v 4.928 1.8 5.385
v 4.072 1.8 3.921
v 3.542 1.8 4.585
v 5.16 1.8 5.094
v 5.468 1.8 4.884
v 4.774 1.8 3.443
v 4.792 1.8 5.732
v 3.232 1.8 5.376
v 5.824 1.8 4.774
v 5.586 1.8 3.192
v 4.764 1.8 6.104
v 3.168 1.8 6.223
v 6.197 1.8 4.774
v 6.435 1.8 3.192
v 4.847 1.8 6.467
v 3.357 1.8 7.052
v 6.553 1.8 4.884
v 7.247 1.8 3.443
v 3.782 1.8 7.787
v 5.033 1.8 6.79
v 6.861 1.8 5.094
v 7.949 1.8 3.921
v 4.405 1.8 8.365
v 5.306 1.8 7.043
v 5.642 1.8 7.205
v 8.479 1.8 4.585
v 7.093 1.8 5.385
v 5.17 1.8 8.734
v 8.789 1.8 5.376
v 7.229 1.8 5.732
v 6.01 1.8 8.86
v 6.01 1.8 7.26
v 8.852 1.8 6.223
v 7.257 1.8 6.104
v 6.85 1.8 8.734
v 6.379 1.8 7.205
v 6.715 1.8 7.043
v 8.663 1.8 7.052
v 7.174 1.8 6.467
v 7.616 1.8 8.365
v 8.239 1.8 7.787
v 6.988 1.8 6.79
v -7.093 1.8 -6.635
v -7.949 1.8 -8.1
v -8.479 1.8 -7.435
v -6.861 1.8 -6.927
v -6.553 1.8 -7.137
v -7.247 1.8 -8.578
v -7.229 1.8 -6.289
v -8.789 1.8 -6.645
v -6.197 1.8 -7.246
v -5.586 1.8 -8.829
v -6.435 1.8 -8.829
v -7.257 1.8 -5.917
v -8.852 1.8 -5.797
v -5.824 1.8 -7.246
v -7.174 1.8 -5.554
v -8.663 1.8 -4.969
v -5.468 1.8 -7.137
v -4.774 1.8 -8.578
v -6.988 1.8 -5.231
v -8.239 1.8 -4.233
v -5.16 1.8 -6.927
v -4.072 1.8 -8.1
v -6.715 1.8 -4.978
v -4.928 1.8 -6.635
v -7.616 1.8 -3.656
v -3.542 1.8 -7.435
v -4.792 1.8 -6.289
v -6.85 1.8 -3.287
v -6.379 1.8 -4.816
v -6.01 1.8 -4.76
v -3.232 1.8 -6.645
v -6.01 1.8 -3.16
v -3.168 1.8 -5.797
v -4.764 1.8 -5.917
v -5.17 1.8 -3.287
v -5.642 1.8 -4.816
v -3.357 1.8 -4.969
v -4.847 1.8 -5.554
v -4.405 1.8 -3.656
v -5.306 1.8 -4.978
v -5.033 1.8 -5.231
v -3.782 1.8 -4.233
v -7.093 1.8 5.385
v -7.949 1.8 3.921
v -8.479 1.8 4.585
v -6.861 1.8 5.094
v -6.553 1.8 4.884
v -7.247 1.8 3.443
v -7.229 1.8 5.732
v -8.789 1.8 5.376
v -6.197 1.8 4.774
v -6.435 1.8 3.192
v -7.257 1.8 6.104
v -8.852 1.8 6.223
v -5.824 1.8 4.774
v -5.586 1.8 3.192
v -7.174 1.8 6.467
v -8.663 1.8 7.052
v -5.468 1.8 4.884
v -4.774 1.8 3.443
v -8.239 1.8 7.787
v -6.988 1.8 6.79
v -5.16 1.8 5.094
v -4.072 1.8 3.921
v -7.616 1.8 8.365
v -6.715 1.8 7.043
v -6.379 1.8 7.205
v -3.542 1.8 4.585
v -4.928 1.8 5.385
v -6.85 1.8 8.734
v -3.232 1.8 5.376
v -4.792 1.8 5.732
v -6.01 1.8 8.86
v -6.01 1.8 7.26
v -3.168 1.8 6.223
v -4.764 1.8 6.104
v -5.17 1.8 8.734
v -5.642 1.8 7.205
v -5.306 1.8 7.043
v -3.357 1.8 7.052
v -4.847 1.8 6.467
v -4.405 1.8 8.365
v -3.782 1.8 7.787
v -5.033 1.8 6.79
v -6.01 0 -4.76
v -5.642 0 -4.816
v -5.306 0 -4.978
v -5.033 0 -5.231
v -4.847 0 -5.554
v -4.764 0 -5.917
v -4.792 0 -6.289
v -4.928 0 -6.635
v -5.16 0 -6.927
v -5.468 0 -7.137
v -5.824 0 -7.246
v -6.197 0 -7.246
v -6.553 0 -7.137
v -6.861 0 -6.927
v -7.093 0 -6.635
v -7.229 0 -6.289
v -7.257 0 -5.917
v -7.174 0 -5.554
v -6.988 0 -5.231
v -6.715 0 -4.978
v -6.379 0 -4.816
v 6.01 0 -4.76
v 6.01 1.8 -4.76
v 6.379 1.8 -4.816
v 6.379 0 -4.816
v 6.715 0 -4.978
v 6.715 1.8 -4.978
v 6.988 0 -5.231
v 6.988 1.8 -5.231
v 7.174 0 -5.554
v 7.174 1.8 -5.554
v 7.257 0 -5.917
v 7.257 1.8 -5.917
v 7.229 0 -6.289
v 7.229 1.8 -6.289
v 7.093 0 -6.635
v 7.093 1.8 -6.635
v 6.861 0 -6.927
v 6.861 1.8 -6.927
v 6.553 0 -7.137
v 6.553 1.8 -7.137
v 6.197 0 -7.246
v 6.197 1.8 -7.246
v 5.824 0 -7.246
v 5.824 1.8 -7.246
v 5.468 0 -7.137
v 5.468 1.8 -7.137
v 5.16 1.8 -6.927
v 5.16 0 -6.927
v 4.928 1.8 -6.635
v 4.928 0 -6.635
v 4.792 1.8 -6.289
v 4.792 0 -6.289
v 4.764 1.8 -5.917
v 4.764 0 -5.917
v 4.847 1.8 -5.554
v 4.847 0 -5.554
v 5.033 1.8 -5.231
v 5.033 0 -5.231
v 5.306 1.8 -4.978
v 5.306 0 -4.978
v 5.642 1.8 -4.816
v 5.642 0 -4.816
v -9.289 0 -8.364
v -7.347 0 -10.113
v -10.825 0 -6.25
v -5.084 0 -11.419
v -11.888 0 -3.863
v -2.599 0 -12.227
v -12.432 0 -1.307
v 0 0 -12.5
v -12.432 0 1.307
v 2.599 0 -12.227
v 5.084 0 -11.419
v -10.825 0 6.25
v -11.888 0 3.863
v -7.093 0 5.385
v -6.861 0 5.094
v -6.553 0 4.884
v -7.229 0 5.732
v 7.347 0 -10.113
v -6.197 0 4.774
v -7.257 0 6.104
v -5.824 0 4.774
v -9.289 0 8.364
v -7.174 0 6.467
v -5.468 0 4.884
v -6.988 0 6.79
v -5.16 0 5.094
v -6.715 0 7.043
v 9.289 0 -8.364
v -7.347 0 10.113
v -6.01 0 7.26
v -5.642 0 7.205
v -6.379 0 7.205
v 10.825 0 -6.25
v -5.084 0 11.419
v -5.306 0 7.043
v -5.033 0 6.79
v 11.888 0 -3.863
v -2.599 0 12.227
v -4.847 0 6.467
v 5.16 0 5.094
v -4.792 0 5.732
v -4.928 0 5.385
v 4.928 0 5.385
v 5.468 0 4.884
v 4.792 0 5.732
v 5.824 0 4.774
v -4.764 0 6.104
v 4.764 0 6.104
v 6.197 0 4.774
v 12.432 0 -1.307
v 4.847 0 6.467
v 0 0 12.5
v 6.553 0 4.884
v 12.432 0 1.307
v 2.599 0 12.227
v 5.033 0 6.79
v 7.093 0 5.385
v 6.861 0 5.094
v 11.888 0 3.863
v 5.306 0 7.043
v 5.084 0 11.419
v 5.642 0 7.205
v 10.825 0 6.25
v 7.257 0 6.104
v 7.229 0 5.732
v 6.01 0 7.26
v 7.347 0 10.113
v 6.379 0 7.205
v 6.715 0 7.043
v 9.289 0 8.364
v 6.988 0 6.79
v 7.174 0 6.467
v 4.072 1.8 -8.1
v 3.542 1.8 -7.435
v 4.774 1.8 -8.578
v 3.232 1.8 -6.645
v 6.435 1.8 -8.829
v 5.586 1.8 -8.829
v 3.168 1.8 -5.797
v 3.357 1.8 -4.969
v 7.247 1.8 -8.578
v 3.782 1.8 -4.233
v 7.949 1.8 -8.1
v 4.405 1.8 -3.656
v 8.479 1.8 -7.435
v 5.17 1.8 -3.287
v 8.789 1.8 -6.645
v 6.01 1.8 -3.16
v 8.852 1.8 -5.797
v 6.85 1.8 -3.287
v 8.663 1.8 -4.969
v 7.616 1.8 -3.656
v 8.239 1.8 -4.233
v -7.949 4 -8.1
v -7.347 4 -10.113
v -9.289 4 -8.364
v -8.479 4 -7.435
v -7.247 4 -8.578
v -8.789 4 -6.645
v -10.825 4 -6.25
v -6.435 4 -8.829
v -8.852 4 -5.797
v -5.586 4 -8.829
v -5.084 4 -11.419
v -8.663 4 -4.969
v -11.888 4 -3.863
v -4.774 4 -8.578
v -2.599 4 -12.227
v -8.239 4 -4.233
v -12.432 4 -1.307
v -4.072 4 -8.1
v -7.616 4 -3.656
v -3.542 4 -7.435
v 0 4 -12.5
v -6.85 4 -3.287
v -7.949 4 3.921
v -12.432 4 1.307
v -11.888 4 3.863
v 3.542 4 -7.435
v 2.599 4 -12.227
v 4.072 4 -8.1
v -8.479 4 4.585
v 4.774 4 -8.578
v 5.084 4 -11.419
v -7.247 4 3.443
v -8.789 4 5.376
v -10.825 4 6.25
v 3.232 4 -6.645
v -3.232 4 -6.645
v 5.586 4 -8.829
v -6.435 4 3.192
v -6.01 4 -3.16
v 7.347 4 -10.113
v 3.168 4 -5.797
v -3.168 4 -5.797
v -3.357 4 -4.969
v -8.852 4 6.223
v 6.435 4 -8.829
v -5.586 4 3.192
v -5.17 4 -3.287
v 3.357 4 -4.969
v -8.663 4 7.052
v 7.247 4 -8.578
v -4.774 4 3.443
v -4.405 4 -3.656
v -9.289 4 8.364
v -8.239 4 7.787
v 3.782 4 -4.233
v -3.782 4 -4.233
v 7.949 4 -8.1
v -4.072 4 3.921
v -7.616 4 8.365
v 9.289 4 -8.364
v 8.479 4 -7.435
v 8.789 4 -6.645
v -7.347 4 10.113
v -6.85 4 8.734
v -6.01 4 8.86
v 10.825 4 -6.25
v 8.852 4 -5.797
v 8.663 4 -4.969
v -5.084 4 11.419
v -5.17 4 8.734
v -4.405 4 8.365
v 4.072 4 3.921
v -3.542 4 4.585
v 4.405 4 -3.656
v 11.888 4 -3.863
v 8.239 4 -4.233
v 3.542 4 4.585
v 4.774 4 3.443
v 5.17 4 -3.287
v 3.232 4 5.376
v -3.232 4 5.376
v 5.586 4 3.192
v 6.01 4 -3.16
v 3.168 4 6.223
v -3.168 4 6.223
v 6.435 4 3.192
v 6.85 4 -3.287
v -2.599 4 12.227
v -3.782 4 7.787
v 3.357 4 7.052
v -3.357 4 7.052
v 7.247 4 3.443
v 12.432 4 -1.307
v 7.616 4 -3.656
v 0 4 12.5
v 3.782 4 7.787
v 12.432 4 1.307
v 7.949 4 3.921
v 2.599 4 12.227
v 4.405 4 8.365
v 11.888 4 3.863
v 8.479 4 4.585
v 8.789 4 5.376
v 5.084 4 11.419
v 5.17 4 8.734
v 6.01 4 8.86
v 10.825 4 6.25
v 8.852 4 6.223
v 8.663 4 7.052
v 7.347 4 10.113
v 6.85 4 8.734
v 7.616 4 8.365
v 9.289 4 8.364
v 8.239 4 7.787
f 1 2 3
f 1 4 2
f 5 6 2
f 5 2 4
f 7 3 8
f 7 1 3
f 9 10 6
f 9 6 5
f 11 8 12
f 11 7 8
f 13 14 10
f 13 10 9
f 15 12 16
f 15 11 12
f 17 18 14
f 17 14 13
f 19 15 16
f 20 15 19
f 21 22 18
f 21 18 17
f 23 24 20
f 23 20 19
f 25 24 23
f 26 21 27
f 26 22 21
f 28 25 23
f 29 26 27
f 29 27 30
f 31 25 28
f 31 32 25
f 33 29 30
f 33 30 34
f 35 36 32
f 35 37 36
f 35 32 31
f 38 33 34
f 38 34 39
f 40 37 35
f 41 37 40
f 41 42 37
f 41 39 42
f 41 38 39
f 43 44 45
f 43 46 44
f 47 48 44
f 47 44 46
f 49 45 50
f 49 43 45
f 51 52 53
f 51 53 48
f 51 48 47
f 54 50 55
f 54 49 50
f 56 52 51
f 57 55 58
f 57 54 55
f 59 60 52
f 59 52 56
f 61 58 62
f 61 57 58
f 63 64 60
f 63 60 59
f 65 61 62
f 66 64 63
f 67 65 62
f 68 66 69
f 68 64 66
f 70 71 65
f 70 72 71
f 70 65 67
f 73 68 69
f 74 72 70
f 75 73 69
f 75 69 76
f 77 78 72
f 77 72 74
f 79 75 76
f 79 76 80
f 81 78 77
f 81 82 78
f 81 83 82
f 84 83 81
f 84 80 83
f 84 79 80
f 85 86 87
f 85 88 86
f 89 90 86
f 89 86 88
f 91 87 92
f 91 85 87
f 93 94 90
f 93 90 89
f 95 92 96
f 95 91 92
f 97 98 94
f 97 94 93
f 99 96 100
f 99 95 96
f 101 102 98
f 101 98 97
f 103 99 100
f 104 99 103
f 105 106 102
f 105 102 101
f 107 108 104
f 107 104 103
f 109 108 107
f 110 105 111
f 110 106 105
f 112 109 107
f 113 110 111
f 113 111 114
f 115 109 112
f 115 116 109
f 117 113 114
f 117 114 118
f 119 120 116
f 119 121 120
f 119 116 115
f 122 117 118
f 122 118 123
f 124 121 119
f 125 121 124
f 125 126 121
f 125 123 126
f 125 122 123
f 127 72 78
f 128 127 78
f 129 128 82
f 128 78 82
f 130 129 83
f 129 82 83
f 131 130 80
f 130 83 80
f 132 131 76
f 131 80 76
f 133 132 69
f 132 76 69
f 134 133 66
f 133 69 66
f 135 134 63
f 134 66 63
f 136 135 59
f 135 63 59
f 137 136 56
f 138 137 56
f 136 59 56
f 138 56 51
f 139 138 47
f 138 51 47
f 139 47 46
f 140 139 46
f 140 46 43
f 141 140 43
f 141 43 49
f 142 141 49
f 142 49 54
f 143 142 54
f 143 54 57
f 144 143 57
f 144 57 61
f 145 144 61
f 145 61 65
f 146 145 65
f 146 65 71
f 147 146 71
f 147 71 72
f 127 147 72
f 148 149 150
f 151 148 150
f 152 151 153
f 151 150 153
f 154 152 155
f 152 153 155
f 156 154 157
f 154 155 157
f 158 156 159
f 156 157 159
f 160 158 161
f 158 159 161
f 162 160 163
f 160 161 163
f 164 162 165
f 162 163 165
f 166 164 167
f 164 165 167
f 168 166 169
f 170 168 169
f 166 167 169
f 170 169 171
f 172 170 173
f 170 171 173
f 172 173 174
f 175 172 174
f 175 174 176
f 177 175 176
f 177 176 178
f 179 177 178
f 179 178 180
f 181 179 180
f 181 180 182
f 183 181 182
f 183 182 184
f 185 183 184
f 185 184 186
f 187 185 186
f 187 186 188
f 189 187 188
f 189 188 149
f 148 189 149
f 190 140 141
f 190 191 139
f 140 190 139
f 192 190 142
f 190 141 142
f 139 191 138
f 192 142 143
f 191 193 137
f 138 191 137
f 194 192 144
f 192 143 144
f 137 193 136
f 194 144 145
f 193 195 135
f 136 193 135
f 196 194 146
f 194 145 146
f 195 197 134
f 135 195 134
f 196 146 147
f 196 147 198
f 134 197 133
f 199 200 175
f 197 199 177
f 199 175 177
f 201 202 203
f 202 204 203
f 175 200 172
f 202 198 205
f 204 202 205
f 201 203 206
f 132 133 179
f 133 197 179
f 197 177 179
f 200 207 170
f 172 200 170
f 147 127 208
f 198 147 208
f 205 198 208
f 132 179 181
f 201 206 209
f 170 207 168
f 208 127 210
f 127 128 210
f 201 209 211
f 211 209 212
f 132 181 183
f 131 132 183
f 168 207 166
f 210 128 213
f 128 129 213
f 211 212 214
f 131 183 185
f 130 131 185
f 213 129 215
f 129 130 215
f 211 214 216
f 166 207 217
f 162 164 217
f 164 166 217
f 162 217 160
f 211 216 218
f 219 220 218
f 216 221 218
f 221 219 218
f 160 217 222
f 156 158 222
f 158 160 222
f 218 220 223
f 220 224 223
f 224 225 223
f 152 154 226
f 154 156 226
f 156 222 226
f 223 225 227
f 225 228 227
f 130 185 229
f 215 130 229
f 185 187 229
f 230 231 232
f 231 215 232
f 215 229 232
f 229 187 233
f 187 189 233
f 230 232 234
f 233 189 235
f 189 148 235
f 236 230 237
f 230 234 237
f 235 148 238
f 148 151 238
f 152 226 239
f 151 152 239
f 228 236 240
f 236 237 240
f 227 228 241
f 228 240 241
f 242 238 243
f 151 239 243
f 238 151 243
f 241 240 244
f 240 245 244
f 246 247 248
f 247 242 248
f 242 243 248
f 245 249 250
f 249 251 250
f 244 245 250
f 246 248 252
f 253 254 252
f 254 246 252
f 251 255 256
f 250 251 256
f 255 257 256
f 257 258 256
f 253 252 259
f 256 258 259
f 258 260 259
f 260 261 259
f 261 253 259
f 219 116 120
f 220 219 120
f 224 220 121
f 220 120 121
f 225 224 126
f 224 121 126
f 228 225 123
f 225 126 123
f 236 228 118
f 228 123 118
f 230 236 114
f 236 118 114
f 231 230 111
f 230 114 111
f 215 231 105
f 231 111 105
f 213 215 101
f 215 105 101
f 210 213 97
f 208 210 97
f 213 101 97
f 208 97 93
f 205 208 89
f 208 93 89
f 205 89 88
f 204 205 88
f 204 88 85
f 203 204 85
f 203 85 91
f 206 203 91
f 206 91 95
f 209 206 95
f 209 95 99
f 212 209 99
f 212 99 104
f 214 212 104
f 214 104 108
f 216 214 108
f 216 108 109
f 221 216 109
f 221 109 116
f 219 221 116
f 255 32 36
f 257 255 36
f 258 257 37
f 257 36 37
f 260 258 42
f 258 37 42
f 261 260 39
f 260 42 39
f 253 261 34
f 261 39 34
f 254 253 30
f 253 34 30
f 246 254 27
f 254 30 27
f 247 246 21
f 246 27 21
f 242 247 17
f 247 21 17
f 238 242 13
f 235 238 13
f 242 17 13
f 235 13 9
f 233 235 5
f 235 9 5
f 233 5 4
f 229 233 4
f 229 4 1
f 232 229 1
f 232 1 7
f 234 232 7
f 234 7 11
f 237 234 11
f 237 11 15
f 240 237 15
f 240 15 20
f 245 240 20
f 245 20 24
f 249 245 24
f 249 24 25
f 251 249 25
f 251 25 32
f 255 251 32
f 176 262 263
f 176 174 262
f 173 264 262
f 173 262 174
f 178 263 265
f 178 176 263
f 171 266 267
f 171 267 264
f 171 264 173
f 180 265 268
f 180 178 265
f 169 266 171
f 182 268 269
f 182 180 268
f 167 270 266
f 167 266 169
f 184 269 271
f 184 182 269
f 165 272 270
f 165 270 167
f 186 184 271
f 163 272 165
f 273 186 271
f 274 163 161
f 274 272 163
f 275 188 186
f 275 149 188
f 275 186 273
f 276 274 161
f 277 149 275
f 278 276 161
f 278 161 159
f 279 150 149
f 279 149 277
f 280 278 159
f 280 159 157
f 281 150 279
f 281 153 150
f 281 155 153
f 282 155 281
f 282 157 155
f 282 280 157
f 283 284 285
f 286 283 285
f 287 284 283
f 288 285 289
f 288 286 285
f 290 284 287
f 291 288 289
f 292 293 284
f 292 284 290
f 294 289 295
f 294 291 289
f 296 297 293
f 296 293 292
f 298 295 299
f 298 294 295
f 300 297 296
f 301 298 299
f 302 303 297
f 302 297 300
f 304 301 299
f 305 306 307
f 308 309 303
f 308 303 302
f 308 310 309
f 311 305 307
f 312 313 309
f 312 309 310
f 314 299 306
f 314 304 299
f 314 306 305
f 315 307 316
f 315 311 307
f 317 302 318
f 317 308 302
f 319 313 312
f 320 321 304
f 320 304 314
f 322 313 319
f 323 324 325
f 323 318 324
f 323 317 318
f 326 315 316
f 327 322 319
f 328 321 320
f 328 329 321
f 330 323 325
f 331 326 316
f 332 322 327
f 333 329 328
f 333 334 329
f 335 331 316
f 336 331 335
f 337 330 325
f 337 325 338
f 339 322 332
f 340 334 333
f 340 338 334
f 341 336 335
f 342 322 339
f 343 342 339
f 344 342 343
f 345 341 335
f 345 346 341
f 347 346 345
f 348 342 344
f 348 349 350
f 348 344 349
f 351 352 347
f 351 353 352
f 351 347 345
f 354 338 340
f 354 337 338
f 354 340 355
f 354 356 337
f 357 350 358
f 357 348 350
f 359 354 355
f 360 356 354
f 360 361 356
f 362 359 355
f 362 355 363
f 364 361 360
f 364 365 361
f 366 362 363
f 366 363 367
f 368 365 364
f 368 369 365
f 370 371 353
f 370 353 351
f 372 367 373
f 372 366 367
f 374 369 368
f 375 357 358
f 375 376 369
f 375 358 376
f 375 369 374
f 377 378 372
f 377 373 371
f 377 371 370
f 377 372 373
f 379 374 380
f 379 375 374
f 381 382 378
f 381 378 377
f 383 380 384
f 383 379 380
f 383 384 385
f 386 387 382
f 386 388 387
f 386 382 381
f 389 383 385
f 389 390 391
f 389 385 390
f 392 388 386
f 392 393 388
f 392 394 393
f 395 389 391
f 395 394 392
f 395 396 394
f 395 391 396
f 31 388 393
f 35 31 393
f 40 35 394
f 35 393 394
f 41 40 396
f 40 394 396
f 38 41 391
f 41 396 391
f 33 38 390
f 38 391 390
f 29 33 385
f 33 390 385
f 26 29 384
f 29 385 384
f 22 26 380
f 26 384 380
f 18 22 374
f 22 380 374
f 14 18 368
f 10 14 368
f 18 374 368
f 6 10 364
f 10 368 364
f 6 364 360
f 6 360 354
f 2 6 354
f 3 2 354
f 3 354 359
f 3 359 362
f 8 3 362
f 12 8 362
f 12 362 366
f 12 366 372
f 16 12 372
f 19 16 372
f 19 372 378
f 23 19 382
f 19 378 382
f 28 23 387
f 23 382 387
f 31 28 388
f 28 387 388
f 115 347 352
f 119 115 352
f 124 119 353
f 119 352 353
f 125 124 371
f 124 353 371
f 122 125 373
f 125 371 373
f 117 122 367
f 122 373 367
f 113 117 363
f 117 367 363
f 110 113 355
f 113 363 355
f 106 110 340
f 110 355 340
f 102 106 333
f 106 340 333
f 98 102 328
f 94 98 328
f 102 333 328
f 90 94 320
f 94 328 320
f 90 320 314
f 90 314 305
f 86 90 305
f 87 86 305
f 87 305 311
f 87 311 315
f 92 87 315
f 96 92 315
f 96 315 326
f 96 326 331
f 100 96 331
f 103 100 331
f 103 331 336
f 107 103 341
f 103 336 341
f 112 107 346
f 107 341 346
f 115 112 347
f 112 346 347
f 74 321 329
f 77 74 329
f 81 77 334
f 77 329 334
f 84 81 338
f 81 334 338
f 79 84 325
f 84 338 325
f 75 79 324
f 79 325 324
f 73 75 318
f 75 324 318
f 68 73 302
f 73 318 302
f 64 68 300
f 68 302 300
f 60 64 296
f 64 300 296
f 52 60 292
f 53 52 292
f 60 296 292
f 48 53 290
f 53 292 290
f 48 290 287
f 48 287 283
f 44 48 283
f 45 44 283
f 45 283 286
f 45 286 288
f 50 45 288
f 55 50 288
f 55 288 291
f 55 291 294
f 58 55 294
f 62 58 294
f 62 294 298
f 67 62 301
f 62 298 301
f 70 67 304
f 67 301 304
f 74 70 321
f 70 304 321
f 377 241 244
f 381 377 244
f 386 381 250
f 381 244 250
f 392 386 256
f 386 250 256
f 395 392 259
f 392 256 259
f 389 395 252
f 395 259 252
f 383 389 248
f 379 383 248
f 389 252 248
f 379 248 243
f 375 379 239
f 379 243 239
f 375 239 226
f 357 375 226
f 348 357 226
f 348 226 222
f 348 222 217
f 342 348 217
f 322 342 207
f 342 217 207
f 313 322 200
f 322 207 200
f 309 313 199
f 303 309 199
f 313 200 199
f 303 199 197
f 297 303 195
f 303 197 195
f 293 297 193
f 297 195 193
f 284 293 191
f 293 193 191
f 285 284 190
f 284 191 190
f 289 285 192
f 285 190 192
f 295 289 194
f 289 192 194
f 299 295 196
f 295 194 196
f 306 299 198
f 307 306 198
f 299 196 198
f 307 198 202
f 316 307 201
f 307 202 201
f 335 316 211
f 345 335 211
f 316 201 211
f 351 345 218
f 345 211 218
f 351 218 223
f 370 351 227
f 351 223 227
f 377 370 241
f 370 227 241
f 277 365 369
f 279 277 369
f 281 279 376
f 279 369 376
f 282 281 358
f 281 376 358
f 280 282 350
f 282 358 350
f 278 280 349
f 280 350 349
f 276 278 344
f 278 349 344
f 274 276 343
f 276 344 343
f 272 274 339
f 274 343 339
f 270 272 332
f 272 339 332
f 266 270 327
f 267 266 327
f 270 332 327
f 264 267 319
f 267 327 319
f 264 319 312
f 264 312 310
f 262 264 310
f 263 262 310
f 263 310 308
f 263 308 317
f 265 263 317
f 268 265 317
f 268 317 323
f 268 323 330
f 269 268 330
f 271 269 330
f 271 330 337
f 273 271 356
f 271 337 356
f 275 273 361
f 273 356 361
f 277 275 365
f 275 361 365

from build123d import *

# Parameters (mm, degrees)
SKETCH_1_R          = 12.5
EXTRUDE_1_DEPTH     = 4
SKETCH_2_R          = 2.85
CUT_EXTRUDE_1_DEPTH = 2.2
SKETCH_3_R          = 1.25
CUT_EXTRUDE_2_DEPTH = 10


with BuildPart() as part:
    # 草图1 → 凸台-拉伸1 (new body)
    with BuildSketch(Plane(origin=(0, 0, 0), x_dir=(1, 0, 0), z_dir=(0, 1, 0))):
        with Locations(Location((0, 0, 0), (0, 0, 270))):
            Circle(SKETCH_1_R)
    extrude(amount=EXTRUDE_1_DEPTH)

    # 草图2 → 切除-拉伸1 (cut)
    with BuildSketch(Plane(origin=(0, 4, 0), x_dir=(1, 0, 0), z_dir=(0, 1, 0))):
        with Locations(Location((6.01040764, 6.01040764, 0), (0, 0, 270))):
            Circle(SKETCH_2_R)
        with Locations(Location((6.01040764, -6.01040764, 0), (0, 0, 270))):
            Circle(SKETCH_2_R)
        with Locations(Location((-6.01040764, -6.01040764, 0), (0, 0, 270))):
            Circle(SKETCH_2_R)
        with Locations(Location((-6.01040764, 6.01040764, 0), (0, 0, 270))):
            Circle(SKETCH_2_R)
    extrude(amount=-CUT_EXTRUDE_1_DEPTH, mode=Mode.SUBTRACT)

    # 草图3 → 切除-拉伸2 (cut)
    with BuildSketch(Plane(origin=(0, 1.8, 0), x_dir=(1, 0, 0), z_dir=(0, 1, 0))):
        with Locations(Location((-6.01040764, 6.01040764, 0), (0, 0, 270))):
            Circle(SKETCH_3_R)
        with Locations(Location((6.01040764, 6.01040764, 0), (0, 0, 270))):
            Circle(SKETCH_3_R)
        with Locations(Location((6.01040764, -6.01040764, 0), (0, 0, 270))):
            Circle(SKETCH_3_R)
        with Locations(Location((-6.01040764, -6.01040764, 0), (0, 0, 270))):
            Circle(SKETCH_3_R)
    extrude(amount=-CUT_EXTRUDE_2_DEPTH, mode=Mode.SUBTRACT)


solid = part.part
